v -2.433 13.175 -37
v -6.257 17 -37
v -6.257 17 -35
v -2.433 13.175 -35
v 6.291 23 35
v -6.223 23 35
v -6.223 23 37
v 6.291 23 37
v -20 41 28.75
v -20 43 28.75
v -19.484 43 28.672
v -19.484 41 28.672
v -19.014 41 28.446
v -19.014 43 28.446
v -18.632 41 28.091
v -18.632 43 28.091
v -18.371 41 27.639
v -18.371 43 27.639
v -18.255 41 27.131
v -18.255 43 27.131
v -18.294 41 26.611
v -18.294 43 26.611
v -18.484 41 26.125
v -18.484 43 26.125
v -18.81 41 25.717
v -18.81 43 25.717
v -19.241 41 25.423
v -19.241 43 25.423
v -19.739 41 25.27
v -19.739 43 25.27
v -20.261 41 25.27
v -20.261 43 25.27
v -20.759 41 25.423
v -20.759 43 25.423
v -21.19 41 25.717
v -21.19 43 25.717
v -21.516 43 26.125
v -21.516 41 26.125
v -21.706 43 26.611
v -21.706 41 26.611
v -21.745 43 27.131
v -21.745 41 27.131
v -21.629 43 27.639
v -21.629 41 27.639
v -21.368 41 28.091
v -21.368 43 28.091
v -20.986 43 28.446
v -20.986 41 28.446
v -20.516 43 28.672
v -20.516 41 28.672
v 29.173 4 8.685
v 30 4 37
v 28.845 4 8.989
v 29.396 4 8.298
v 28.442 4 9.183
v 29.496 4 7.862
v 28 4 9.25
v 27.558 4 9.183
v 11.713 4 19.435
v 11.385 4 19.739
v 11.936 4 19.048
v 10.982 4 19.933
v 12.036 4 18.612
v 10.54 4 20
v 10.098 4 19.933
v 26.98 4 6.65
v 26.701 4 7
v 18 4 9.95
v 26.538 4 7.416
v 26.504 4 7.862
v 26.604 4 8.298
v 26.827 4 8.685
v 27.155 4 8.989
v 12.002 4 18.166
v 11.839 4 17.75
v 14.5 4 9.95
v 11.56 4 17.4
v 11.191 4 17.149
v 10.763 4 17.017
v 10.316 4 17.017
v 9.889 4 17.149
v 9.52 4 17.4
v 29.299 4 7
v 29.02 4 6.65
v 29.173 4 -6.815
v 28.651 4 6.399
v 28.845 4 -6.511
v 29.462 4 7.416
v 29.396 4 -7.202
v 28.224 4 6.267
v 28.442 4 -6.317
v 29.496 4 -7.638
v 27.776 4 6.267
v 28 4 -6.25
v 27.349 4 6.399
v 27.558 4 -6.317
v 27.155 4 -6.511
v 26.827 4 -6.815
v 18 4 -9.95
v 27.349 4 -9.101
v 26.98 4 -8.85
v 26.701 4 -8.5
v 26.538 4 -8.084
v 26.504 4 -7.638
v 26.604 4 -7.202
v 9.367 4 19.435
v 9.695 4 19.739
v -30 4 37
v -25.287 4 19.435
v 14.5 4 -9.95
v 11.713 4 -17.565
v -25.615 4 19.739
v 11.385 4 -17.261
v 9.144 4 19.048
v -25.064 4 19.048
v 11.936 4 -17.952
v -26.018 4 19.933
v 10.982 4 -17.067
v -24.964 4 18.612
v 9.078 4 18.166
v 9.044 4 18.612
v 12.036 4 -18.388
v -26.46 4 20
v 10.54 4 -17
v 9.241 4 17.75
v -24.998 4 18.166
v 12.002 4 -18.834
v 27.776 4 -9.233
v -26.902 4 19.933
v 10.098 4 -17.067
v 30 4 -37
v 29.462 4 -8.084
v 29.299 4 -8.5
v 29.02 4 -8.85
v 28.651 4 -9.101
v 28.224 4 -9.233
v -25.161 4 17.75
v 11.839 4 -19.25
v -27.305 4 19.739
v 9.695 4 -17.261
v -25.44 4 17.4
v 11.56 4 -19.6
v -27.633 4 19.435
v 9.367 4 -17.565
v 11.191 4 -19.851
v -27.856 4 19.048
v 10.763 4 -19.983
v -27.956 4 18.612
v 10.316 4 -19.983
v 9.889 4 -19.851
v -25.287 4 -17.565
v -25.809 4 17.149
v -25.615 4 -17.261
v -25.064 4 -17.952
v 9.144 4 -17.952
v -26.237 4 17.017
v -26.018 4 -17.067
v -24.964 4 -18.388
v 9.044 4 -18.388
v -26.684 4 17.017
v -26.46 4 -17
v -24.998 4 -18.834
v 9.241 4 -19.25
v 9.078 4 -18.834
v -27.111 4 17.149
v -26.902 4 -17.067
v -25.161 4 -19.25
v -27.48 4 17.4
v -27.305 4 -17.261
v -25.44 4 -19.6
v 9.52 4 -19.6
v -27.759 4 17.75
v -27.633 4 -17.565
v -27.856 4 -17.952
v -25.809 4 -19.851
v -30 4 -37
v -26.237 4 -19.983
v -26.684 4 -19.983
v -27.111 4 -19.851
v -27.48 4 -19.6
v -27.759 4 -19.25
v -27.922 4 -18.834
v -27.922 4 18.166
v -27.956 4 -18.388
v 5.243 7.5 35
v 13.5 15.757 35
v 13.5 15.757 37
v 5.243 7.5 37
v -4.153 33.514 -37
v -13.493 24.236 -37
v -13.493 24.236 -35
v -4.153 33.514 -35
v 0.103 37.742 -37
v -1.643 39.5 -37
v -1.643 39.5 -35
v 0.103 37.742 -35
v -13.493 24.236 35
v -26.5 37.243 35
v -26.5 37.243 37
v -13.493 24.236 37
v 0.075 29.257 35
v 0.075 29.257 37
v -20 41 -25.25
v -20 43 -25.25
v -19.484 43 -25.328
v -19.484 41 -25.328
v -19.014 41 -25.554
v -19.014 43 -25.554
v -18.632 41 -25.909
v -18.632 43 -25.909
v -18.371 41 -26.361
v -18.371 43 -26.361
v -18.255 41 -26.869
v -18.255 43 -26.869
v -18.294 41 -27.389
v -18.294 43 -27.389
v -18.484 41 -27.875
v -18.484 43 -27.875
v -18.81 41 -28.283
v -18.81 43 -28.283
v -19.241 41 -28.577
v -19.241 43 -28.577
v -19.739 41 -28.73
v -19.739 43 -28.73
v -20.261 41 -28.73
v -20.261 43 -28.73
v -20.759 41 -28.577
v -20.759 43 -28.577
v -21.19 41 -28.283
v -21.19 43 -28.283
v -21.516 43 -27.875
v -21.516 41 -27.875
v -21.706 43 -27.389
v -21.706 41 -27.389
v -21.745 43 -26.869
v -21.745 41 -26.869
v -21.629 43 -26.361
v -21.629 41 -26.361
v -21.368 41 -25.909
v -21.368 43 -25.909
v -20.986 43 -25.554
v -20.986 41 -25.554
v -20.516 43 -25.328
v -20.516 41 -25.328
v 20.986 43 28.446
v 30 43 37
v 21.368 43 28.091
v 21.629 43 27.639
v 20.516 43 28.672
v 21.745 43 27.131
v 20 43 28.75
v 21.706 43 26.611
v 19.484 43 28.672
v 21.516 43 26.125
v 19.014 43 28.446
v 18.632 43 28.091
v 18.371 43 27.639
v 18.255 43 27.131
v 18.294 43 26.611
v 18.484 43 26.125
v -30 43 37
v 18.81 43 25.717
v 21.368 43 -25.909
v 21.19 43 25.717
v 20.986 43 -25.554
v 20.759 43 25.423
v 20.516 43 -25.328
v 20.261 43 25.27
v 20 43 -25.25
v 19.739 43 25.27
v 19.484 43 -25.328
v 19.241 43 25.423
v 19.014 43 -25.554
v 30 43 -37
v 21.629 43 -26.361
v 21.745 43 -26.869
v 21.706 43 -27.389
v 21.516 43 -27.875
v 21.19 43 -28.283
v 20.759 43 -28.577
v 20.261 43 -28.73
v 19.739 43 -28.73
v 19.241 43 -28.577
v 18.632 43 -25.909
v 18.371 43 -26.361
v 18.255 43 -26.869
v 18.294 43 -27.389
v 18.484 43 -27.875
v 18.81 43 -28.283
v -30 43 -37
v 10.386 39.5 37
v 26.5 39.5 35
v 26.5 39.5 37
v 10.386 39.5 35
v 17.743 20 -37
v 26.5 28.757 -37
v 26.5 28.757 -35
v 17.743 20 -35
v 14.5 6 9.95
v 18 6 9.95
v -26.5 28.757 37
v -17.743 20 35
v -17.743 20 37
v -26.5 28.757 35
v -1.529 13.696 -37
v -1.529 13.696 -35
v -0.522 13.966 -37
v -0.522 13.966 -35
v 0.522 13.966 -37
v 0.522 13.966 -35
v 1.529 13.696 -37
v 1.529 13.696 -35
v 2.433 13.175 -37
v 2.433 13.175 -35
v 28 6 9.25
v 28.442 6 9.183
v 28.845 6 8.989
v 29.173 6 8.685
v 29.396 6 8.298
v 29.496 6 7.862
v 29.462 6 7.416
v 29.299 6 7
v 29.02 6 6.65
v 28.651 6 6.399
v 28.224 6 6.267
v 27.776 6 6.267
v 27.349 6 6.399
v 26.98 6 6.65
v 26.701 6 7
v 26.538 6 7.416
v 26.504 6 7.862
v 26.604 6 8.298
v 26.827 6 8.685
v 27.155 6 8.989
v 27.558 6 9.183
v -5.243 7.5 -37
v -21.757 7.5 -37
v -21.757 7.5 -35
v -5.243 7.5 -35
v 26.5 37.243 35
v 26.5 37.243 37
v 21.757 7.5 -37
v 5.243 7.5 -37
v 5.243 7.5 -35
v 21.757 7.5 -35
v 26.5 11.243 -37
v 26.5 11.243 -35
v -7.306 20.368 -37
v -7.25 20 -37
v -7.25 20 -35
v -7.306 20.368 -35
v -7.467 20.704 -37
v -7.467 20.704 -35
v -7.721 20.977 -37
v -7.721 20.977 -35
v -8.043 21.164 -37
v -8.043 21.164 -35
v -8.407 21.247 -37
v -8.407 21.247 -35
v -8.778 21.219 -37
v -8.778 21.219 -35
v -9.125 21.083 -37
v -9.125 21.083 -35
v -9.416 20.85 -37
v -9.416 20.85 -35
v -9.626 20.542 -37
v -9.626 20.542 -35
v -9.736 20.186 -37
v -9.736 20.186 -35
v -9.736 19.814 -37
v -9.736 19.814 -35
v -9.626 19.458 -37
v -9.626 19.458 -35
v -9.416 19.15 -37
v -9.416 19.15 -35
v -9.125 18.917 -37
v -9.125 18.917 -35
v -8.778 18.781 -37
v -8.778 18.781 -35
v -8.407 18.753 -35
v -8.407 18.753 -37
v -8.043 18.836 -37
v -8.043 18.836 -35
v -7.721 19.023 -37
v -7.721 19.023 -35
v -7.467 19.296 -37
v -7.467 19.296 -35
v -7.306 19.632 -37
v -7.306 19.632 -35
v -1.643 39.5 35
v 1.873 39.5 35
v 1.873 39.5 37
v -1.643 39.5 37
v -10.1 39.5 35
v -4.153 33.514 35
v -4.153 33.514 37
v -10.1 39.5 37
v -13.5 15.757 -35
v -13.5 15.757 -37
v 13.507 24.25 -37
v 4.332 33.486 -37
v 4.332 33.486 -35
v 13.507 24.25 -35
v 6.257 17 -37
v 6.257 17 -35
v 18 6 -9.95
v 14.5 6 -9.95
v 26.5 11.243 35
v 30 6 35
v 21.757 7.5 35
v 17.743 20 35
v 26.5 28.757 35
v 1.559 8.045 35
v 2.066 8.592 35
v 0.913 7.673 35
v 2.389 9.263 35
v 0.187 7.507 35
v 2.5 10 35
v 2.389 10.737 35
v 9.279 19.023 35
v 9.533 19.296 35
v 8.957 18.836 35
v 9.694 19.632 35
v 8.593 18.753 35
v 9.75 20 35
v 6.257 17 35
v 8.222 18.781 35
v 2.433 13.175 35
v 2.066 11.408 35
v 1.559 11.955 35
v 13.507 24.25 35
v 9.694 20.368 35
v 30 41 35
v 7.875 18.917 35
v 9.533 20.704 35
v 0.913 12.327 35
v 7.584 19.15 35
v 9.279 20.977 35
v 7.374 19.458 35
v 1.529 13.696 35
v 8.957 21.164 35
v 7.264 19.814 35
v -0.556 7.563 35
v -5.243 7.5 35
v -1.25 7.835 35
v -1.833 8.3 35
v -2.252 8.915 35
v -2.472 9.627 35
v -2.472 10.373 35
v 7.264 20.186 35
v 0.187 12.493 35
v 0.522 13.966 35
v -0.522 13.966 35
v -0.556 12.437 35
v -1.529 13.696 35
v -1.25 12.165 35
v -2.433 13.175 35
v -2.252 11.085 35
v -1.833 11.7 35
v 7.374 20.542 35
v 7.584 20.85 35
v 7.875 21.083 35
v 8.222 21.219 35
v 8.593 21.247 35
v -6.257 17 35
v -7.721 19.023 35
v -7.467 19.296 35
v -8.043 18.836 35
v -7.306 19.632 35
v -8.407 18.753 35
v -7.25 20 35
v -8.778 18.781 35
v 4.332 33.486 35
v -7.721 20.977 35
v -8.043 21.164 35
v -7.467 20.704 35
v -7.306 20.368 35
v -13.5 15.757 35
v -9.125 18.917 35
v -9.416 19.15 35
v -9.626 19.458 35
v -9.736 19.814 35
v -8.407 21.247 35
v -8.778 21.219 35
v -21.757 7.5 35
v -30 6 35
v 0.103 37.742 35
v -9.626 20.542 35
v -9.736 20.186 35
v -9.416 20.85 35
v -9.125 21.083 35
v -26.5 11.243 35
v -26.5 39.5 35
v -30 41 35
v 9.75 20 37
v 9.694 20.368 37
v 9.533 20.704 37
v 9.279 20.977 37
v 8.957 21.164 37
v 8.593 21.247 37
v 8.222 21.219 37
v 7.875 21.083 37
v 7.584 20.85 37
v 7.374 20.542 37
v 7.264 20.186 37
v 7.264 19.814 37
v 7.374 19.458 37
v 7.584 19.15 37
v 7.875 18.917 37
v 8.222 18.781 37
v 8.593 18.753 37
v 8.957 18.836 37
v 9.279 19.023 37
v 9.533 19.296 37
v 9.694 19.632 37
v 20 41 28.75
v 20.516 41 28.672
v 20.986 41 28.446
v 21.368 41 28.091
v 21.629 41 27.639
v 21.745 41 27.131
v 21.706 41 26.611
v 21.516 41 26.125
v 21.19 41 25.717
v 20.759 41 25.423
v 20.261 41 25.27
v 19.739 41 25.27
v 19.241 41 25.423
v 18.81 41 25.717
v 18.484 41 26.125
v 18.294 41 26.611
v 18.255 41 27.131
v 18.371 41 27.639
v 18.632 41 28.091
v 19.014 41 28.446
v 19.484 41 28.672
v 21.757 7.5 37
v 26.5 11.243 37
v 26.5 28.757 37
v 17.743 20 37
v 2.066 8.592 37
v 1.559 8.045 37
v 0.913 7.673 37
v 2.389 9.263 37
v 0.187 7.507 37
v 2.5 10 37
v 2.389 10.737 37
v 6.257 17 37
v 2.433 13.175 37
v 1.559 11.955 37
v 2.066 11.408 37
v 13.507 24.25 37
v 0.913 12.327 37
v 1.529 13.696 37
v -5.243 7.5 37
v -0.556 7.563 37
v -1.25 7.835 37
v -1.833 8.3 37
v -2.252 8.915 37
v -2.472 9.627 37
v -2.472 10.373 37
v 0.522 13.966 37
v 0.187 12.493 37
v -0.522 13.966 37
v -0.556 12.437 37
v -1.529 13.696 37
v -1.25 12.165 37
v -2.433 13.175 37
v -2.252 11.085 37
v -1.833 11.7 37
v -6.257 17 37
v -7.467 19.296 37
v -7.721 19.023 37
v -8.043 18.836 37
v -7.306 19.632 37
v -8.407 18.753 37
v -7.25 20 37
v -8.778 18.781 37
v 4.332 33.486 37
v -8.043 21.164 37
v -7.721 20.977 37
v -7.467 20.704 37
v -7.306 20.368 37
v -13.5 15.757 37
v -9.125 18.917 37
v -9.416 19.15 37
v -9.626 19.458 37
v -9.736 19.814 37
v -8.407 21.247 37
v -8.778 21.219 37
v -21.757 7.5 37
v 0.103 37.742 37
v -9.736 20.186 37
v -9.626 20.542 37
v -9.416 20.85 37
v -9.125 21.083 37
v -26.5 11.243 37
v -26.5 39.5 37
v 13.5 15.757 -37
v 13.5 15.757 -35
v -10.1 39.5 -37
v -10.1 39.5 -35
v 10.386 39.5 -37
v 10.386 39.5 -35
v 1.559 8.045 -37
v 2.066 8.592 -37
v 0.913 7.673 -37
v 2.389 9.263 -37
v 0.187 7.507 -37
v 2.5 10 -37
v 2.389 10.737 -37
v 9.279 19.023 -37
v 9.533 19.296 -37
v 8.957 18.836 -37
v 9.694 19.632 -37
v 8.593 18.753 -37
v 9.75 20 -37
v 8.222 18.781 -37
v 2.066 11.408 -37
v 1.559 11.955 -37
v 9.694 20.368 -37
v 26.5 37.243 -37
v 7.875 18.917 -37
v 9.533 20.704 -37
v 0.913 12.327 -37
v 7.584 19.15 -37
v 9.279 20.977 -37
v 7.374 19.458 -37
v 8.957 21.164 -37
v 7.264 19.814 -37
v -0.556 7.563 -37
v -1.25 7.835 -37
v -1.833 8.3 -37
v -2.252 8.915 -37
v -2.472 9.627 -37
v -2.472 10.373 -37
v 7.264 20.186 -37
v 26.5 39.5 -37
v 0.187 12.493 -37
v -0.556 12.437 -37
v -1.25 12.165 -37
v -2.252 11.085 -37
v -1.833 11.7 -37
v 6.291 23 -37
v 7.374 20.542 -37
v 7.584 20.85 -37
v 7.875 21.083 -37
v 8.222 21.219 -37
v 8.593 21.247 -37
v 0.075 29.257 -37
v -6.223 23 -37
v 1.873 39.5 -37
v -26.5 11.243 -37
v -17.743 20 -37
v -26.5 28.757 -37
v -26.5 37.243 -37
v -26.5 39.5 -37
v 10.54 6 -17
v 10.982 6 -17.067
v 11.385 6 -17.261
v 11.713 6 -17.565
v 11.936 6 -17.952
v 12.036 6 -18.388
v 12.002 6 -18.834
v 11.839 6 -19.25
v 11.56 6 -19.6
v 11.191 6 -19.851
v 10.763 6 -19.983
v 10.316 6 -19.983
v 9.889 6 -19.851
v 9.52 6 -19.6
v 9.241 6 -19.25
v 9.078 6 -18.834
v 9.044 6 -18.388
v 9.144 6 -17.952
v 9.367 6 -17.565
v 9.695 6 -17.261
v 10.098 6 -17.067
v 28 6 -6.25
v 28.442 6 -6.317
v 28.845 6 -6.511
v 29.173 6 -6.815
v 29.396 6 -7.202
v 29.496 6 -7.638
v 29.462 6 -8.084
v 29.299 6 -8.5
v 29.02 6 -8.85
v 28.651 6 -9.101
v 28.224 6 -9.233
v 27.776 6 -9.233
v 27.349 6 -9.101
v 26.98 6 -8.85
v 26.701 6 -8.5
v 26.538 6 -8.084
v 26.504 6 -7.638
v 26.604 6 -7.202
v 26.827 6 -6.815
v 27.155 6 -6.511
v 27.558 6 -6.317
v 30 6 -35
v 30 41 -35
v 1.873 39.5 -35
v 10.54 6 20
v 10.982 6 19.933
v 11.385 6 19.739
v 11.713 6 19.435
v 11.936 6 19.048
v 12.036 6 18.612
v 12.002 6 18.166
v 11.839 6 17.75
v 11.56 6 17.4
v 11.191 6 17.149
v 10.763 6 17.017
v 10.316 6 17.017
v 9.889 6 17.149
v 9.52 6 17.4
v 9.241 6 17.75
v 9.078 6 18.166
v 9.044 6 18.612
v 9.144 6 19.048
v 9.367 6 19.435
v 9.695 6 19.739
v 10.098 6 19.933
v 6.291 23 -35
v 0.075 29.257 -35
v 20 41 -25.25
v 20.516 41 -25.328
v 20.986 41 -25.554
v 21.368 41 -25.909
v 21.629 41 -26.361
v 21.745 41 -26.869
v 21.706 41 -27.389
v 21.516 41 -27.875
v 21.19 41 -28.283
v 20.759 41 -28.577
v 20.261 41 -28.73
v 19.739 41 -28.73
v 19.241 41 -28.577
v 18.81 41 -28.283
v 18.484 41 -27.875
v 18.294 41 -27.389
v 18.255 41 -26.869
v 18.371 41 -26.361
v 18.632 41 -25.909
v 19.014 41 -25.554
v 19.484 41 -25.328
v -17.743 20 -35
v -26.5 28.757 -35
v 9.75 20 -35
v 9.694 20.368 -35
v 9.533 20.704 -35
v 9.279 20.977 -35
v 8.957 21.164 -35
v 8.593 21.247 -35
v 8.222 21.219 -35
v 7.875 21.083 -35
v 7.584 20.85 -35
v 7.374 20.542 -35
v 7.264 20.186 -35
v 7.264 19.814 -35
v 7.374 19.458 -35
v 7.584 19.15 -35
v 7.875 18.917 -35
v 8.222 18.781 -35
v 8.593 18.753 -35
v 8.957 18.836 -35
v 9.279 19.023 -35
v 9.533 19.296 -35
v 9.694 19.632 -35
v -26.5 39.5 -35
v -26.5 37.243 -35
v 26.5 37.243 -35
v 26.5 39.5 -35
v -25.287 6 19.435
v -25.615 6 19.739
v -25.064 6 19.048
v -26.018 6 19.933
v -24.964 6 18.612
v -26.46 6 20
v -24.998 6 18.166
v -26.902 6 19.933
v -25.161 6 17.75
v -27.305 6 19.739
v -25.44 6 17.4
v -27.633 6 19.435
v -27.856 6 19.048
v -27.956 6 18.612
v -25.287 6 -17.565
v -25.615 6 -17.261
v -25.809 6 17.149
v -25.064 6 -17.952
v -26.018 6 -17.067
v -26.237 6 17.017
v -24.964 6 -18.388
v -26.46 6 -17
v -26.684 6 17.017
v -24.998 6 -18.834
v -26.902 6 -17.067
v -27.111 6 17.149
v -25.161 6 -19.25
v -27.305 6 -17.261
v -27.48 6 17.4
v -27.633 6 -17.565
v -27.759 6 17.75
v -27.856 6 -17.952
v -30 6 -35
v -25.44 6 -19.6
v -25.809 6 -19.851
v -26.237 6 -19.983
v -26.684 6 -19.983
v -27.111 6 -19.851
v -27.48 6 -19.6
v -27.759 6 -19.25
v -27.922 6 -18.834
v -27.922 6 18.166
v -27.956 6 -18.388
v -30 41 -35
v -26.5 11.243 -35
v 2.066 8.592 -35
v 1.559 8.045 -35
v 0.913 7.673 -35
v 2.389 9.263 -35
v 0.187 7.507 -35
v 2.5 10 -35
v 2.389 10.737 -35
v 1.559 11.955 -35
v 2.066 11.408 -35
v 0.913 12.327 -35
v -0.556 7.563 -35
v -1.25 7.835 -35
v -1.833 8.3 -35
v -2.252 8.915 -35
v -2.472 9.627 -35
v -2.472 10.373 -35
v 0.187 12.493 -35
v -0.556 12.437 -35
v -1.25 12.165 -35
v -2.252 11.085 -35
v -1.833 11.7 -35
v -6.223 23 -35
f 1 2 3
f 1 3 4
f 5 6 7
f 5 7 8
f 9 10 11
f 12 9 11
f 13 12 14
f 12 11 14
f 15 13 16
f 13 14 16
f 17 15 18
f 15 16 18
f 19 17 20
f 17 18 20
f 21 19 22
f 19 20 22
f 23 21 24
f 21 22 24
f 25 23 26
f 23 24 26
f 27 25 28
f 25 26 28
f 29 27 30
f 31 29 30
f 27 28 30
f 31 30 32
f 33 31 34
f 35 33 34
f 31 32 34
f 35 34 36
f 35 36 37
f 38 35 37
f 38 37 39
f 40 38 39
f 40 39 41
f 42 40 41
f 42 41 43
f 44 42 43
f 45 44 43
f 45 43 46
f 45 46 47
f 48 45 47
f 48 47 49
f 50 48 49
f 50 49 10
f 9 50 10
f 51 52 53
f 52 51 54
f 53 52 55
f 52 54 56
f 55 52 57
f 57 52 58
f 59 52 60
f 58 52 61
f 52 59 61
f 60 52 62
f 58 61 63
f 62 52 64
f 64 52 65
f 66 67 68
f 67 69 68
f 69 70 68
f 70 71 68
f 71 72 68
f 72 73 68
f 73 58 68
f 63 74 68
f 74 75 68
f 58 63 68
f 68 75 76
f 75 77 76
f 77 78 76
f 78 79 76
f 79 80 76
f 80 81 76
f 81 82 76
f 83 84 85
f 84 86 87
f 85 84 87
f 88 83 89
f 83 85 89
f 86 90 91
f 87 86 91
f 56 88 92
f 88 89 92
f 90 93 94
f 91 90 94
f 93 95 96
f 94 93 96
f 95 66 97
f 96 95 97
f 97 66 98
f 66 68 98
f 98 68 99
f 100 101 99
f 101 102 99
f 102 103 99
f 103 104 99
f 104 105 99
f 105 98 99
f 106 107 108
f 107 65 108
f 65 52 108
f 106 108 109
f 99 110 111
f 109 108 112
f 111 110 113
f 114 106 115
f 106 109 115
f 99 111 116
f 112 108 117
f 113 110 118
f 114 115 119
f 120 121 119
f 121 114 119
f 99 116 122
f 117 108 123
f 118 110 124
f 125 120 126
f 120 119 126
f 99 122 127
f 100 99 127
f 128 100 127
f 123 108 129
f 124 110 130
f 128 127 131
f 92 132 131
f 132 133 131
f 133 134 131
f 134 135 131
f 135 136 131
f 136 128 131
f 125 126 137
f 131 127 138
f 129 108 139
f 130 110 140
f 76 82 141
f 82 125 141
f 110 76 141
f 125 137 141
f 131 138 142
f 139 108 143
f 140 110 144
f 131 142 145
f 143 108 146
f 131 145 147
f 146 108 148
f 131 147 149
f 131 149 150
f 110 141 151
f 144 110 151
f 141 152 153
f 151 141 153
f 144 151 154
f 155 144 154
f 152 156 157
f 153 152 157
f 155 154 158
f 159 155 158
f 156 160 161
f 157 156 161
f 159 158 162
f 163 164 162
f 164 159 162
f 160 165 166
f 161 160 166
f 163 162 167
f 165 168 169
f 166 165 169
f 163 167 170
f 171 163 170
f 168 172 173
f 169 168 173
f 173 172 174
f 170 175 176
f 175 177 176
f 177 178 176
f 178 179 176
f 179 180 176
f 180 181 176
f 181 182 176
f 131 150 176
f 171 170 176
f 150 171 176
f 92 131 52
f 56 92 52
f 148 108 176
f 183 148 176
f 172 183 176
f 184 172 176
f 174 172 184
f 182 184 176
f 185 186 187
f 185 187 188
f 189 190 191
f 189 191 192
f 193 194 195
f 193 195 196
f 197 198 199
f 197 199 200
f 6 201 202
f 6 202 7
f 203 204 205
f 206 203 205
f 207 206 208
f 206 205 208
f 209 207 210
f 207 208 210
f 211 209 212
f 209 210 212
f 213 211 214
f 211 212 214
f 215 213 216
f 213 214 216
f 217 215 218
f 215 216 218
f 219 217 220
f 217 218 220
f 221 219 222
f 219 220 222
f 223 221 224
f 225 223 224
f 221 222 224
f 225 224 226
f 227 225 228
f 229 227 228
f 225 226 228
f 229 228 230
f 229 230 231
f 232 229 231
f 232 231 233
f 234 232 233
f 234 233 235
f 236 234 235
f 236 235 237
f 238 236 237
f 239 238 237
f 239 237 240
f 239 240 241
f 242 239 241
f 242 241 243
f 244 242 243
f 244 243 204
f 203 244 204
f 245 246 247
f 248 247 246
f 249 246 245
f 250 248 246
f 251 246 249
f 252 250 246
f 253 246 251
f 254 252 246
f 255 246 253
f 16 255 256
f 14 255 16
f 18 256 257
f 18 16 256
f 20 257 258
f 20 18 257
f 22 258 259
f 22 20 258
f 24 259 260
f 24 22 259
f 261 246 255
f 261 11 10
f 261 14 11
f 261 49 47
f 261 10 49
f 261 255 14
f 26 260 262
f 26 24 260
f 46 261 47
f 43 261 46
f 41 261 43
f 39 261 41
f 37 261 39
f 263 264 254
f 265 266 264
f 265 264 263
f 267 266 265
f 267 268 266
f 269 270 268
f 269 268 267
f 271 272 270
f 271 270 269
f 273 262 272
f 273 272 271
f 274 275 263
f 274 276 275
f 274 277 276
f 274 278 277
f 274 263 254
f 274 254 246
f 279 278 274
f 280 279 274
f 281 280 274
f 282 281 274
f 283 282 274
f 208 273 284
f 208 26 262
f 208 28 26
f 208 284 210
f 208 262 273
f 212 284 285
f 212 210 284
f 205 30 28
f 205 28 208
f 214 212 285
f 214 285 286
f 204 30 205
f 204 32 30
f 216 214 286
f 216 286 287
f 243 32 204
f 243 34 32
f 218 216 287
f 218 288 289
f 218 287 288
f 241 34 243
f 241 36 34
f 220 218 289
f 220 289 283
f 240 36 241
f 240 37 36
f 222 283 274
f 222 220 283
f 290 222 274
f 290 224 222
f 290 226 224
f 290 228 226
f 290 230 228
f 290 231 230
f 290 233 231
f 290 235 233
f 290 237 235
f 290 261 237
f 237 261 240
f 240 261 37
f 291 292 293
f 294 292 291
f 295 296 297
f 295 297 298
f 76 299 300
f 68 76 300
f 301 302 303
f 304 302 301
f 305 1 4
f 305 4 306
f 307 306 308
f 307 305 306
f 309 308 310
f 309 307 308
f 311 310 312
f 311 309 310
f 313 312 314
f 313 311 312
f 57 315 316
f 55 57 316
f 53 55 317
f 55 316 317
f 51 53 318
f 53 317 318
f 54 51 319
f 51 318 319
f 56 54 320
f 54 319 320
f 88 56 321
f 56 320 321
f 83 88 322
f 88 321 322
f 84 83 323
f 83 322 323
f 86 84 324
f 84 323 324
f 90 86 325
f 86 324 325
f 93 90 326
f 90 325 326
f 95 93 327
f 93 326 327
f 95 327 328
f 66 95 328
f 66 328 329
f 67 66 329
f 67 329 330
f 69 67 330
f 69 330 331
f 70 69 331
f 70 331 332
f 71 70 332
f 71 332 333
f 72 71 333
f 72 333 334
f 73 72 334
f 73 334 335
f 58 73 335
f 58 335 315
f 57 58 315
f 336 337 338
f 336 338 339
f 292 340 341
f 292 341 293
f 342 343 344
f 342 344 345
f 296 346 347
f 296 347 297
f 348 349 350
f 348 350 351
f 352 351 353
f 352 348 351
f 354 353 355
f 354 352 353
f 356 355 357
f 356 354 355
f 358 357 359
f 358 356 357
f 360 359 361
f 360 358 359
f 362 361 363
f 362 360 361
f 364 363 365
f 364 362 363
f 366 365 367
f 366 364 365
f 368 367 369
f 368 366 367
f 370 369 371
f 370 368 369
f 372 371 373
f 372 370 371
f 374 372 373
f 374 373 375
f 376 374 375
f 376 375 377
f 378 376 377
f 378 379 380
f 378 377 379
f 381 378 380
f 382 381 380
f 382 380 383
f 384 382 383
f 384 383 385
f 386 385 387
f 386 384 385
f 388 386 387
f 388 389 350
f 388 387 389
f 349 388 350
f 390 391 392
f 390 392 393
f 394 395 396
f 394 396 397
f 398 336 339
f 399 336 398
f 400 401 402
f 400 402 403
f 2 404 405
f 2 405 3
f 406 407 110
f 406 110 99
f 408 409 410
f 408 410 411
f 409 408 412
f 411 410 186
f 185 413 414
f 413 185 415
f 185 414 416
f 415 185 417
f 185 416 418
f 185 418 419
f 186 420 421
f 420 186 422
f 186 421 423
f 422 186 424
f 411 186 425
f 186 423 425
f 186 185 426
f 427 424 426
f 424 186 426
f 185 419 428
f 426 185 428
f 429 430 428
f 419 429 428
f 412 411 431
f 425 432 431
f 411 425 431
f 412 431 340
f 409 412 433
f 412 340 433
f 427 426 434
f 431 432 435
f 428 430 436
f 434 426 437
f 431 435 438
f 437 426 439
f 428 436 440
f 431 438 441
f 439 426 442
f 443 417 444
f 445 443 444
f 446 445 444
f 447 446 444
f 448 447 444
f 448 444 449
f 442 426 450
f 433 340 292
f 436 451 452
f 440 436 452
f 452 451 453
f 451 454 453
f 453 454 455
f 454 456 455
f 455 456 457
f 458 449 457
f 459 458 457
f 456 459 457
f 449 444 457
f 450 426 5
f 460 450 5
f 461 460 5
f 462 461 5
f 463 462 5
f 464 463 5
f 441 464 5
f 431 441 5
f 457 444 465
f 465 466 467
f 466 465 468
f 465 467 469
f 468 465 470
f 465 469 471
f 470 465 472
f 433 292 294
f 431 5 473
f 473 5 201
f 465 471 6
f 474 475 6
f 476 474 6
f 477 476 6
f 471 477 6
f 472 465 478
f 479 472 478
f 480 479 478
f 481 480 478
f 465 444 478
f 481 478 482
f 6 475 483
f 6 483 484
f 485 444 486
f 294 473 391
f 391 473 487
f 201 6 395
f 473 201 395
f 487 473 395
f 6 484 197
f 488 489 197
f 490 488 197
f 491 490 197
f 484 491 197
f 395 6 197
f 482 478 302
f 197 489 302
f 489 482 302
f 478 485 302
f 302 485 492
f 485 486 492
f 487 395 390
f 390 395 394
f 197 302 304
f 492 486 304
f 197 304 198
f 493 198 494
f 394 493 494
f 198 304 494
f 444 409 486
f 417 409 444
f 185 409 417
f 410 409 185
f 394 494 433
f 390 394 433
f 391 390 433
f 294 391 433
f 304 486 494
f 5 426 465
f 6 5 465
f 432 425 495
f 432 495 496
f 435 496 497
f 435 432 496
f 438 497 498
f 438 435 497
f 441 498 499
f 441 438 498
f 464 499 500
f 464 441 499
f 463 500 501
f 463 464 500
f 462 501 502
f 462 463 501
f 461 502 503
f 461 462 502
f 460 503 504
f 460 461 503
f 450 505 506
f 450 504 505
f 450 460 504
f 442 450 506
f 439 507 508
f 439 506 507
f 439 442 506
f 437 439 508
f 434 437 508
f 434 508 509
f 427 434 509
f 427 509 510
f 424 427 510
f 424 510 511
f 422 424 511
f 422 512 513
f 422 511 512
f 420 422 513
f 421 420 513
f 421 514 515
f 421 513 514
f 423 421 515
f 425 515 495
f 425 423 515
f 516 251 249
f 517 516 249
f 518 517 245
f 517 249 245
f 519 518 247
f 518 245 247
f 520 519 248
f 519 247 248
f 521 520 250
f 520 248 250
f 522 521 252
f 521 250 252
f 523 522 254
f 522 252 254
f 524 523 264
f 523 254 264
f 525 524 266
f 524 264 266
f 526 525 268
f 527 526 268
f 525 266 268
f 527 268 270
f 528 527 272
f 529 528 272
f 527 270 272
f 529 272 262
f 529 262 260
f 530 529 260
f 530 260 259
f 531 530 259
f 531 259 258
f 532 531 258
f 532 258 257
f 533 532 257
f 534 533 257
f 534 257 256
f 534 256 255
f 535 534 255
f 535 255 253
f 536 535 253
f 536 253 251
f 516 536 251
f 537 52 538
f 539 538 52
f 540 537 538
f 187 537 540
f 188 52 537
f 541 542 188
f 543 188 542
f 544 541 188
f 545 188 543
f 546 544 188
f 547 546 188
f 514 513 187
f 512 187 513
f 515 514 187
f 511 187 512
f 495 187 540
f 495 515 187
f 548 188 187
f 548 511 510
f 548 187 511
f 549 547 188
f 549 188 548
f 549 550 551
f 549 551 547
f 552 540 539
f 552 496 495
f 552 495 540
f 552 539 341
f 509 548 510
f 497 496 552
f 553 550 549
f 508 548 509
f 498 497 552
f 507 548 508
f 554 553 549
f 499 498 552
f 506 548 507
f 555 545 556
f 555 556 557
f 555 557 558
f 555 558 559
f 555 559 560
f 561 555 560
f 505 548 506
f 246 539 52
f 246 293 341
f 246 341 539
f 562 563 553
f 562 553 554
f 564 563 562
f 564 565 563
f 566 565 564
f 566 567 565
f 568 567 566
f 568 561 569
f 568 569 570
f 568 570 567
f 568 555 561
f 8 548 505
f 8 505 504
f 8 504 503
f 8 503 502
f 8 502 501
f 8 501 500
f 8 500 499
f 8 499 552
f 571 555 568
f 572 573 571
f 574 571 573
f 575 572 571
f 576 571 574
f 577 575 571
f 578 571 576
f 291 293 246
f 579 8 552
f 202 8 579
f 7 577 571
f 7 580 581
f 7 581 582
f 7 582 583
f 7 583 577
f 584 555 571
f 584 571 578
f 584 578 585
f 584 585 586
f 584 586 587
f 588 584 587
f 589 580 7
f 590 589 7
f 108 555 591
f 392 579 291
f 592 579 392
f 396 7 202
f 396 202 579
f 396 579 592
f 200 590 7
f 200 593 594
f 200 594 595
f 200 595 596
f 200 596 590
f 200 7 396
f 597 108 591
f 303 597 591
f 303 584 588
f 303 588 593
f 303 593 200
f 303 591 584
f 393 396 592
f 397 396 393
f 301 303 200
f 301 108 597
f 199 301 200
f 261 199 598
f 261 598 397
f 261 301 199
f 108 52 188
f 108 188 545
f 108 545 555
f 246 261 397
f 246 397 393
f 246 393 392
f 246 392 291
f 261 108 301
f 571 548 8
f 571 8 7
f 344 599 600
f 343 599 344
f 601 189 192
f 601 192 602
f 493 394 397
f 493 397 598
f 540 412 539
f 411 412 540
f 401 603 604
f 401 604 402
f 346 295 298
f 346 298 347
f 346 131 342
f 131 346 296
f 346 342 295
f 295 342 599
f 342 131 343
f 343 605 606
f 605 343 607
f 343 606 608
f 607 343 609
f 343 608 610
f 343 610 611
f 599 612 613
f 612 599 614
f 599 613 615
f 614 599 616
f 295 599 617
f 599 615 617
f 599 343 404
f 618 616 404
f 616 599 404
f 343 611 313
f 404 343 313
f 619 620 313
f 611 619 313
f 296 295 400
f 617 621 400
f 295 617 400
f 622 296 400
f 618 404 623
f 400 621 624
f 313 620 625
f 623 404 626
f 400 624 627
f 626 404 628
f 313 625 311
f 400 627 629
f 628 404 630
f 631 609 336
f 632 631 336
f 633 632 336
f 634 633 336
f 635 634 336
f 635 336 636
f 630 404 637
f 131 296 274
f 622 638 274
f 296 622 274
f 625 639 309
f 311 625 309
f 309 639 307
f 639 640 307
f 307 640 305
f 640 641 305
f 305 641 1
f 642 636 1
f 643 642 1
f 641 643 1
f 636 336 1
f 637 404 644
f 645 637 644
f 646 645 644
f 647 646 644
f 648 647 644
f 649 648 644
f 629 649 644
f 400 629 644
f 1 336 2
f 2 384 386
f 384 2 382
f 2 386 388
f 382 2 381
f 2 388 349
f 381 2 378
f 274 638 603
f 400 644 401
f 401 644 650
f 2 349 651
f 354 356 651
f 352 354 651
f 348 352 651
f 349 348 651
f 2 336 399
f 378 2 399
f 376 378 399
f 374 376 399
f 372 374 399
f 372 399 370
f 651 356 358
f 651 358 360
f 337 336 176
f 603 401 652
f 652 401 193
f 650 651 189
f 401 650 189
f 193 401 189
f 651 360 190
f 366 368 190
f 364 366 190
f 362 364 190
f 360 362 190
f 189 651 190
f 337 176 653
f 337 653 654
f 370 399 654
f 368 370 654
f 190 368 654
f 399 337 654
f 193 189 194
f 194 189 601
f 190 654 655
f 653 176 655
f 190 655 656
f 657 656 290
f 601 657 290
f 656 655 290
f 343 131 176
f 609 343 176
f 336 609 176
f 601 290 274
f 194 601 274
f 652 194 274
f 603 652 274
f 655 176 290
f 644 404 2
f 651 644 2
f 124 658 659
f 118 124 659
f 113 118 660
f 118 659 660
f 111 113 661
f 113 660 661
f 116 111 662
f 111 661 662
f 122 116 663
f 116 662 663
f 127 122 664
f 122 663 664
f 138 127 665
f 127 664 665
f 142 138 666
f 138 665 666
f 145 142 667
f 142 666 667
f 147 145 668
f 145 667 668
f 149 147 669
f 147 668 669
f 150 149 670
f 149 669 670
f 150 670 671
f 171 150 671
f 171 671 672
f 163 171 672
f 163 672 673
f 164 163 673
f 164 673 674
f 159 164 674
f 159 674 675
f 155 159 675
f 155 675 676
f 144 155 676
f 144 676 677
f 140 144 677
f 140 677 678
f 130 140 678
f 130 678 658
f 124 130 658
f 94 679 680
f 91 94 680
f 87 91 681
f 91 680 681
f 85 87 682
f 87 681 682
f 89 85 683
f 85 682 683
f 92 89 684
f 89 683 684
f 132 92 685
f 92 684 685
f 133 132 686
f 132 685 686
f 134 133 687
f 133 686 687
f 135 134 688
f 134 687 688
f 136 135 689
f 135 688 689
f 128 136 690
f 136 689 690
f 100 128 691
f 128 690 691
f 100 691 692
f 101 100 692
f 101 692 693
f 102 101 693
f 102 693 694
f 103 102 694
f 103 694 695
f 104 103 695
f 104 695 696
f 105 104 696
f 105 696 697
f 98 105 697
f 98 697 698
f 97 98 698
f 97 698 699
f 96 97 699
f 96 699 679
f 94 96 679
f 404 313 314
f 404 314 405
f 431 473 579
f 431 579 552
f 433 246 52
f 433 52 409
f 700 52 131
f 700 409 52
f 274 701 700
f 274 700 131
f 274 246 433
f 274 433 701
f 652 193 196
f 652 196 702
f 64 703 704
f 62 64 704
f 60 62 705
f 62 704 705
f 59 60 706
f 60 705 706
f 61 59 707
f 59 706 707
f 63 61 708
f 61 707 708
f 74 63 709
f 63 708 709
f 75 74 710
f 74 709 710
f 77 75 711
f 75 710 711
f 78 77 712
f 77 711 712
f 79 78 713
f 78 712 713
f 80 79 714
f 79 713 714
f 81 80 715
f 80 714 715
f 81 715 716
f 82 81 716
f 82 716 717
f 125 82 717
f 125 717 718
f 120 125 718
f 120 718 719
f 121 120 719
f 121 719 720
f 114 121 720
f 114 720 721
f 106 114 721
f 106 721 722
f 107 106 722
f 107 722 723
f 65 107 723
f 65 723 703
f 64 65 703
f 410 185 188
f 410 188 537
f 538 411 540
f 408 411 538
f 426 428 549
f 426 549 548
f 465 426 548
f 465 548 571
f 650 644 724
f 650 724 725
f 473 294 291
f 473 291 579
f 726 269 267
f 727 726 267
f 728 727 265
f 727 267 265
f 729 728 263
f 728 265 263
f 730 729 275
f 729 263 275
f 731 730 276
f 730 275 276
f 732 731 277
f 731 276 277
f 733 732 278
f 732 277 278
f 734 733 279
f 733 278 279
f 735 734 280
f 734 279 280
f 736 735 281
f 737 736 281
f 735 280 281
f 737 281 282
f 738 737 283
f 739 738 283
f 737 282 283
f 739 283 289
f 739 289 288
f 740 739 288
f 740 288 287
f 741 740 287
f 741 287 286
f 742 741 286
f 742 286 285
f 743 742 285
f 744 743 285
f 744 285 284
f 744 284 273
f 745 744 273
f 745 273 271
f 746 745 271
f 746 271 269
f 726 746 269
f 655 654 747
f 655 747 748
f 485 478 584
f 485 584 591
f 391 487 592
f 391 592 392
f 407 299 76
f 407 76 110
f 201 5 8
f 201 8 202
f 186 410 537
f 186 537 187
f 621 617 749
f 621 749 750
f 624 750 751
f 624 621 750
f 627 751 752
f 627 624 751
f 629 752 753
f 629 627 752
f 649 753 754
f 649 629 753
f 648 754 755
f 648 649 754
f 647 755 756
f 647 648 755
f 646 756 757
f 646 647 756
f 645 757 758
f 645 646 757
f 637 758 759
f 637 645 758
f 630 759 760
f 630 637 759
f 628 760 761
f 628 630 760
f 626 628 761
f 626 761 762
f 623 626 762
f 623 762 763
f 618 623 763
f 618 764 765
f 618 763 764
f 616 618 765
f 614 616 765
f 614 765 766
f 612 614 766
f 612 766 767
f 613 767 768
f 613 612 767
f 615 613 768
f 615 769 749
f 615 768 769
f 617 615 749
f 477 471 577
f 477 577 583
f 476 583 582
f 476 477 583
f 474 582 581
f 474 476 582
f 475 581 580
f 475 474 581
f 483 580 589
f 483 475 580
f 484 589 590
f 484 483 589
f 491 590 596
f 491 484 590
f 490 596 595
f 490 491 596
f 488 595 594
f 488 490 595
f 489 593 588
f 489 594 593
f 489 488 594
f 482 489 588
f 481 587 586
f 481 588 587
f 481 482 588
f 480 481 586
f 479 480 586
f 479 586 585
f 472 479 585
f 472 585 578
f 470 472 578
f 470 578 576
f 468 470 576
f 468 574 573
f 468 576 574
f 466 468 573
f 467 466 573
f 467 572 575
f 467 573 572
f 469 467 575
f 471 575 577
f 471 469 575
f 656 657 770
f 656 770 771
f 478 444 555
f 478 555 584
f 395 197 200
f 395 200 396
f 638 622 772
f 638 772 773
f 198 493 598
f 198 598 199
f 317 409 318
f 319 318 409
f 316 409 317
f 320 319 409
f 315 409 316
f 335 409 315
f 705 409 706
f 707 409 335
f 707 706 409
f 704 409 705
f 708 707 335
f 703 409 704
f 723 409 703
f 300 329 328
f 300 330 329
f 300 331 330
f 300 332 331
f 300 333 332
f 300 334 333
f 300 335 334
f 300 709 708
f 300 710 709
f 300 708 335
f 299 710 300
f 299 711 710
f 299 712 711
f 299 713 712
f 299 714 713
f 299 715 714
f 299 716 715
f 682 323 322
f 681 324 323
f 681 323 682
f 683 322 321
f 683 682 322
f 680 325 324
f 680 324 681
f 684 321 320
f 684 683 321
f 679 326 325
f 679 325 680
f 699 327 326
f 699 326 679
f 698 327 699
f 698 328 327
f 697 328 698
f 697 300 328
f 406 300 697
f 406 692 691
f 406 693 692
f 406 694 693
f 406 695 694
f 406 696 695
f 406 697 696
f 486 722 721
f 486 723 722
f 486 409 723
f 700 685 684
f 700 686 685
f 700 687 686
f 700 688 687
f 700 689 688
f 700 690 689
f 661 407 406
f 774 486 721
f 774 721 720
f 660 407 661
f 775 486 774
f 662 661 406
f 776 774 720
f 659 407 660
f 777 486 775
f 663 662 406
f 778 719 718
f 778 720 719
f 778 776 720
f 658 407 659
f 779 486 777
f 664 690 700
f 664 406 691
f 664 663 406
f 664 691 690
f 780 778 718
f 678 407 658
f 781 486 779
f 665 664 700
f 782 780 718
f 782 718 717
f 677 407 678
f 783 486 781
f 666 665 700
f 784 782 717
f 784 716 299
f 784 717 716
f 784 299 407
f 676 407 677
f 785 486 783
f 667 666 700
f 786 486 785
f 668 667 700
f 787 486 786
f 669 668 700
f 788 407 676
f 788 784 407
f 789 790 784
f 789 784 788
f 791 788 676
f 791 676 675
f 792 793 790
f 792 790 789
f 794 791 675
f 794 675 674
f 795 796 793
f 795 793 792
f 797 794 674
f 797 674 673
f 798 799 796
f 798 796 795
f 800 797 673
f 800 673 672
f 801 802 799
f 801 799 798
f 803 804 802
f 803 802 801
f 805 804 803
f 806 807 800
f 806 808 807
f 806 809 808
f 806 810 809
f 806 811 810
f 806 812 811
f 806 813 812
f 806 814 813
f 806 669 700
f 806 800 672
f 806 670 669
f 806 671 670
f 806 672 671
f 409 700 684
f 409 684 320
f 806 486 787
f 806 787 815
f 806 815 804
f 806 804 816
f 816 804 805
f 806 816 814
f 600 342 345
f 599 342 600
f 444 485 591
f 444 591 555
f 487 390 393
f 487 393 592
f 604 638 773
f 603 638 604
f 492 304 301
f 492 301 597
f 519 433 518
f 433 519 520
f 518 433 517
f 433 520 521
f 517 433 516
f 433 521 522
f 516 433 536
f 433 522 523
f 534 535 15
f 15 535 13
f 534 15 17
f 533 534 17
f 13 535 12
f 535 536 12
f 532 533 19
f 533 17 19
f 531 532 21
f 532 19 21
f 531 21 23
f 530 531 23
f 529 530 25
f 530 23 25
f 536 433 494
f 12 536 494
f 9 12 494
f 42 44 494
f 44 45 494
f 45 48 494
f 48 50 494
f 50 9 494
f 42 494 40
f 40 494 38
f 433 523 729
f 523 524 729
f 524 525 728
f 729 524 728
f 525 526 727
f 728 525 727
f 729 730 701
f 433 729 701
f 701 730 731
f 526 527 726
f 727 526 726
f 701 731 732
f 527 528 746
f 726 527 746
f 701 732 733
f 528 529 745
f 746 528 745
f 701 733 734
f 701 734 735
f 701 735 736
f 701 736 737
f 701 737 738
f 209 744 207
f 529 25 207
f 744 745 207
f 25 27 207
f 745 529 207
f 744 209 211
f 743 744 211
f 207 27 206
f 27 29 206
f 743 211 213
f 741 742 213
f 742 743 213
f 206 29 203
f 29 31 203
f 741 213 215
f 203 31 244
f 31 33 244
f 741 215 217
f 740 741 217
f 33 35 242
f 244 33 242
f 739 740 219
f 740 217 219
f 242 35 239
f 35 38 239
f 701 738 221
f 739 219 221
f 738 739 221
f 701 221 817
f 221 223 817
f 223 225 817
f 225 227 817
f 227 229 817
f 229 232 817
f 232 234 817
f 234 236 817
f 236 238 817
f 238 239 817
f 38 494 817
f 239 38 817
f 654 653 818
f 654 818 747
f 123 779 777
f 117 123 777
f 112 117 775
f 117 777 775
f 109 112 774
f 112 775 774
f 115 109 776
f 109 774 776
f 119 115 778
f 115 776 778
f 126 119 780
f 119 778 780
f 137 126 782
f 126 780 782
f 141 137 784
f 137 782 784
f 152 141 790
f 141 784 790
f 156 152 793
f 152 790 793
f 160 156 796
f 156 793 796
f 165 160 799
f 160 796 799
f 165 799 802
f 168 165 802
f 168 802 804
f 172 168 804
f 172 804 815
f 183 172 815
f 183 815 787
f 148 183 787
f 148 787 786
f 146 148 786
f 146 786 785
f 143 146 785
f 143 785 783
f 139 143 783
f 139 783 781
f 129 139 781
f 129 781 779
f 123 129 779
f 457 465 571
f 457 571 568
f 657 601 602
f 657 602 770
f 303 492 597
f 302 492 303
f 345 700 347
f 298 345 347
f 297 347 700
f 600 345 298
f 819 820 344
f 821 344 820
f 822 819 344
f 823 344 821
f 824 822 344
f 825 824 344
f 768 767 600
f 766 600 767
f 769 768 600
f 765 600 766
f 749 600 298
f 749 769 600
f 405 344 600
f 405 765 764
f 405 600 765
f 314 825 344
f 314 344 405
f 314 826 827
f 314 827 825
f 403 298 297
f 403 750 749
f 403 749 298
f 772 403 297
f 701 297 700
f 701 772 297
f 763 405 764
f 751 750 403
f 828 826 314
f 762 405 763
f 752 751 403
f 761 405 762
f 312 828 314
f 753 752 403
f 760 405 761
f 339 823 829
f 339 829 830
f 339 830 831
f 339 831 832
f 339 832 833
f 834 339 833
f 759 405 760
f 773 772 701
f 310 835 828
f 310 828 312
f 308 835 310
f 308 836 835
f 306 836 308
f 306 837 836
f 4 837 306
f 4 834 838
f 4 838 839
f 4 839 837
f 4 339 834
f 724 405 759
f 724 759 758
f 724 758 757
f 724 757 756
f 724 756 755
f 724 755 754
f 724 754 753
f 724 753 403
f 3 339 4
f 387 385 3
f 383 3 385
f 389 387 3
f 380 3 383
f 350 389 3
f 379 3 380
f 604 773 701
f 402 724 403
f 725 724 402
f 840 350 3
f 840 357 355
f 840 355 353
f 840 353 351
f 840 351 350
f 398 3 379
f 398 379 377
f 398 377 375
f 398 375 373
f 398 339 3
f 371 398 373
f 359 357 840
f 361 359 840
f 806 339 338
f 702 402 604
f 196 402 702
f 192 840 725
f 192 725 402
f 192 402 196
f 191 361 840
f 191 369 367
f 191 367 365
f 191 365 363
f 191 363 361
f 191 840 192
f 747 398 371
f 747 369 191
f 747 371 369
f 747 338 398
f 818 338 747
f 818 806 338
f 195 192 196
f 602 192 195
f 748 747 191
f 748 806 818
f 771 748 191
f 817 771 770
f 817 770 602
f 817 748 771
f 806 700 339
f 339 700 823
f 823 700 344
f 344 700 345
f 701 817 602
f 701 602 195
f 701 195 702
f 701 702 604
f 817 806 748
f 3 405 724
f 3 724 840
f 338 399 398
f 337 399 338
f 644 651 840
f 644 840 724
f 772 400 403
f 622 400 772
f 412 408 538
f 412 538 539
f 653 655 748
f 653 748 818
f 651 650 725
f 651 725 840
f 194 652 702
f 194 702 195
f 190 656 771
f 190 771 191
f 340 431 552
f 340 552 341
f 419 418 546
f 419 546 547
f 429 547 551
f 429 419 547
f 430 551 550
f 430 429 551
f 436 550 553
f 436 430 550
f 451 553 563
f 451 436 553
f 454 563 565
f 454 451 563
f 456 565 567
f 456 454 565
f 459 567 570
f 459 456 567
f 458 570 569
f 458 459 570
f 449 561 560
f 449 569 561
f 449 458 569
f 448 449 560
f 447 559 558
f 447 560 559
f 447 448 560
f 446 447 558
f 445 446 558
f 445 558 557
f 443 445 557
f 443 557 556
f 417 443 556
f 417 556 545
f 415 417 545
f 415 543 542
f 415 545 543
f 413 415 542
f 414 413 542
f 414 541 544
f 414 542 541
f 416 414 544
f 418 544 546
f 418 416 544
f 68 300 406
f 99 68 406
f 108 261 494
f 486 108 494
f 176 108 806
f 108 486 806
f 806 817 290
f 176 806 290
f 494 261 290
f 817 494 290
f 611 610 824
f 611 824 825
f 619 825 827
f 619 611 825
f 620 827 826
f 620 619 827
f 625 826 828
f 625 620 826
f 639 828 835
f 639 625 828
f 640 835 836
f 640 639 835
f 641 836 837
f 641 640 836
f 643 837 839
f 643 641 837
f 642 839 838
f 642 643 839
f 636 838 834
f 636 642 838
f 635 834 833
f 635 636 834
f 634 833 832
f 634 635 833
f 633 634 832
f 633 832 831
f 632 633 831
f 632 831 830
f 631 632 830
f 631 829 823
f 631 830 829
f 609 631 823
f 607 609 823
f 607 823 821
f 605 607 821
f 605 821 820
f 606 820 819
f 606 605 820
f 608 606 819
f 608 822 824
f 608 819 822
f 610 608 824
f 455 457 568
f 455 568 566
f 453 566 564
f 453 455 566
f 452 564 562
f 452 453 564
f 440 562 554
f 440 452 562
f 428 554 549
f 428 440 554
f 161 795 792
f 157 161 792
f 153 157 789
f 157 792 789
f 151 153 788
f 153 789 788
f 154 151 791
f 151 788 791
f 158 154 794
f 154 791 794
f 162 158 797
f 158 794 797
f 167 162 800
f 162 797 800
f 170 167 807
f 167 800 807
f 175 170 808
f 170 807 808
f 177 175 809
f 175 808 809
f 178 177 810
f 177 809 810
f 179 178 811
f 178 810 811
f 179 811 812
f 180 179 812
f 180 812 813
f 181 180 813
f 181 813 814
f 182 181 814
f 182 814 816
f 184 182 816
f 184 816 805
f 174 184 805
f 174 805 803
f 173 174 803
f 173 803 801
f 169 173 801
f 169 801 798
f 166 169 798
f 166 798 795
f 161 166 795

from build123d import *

# Parameters (mm, degrees)
BOSS_EXTRUDE1_DEPTH      = 30
BOSS_EXTRUDE1_DEPTH_BACK = 30
SKETCH2_W                = 74
SKETCH2_H                = 39
SKETCH2_W_2              = 70
SKETCH2_H_2              = 35
CUT_EXTRUDE1_DEPTH       = 65.171644829
CUT_EXTRUDE1_DEPTH_BACK  = 65.171644829
SKETCH1_R                = 1.25
SKETCH1_R_2              = 2.5
CUT_EXTRUDE2_START       = -37
CUT_EXTRUDE2_DEPTH       = 74
SKETCH4_R                = 1.75
CUT_EXTRUDE3_DEPTH       = 3
SKETCH5_R                = 1.5
SKETCH5_W                = 3.5
SKETCH5_H                = 19.9
CUT_EXTRUDE4_DEPTH       = 61.3158354


# Read off the part's stored shape, not the designer's step: Cut-Extrude2
with BuildPart() as part:
    # Sketch2 → Boss-Extrude1 (new, two sides: drawn at the far end of the back side and taken through both)
    with BuildSketch(Plane(origin=(0, 0, 0), x_dir=(0, 0, -1), z_dir=(1, 0, 0)).offset(-BOSS_EXTRUDE1_DEPTH_BACK)):
        with Locations((0, 23.5)):
            Rectangle(SKETCH2_W, SKETCH2_H)
        with Locations((0, 23.5)):
            Rectangle(SKETCH2_W_2, SKETCH2_H_2, mode=Mode.SUBTRACT)
    extrude(amount=BOSS_EXTRUDE1_DEPTH + BOSS_EXTRUDE1_DEPTH_BACK)

    # Sketch1 → Cut-Extrude1 (cut, two sides: drawn at the far end of the back side and taken through both)
    with BuildSketch(Plane.XY.offset(-CUT_EXTRUDE1_DEPTH_BACK)):
        with Locations((8.5, 20)):
            Circle(SKETCH1_R)
        with Locations((-8.5, 20)):
            Circle(SKETCH1_R)
        with Locations((0, 10)):
            Circle(SKETCH1_R_2)
    extrude(amount=CUT_EXTRUDE1_DEPTH + CUT_EXTRUDE1_DEPTH_BACK, mode=Mode.SUBTRACT)

    # Cut-Extrude2 outline → Cut-Extrude2 (cut)
    with BuildSketch(Plane.XY.offset(CUT_EXTRUDE2_START)):
        Polygon((-6.223385238, 23), (6.291063493, 23), (0.075182746, 29.257087778), align=None)
        Polygon((-13.493003356, 24.235644043), (-4.153418424, 33.513721677), (-10.100273174, 39.5), (-26.5, 39.5), (-26.5, 37.242640687), align=None)
        Polygon((10.385998459, 39.5), (4.331816644, 33.485688948), (13.507019797, 24.249660484), (26.5, 37.242640687), (26.5, 39.5), align=None)
        Polygon((21.757359313, 7.5), (13.5, 15.757359313), (5.242640687, 7.5), align=None)
        Polygon((26.5, 28.757359313), (17.742640687, 20), (26.5, 11.242640687), align=None)
        Polygon((-13.5, 15.757359313), (-21.757359313, 7.5), (-5.242640687, 7.5), align=None)
        with BuildLine():
            Line((2.432627089, 13.175267776), (6.257359313, 17))
            Line((6.257359313, 17), (-6.257359313, 17))
            Line((-6.257359313, 17), (-2.432627089, 13.175267776))
            ThreePointArc((-2.432627089, 13.175267776), (0, 14), (2.432627089, 13.175267776))
        make_face()
        Polygon((-26.5, 11.242640687), (-17.742640687, 20), (-26.5, 28.757359313), align=None)
        Polygon((1.872544824, 39.5), (-1.642886221, 39.5), (0.103215475, 37.742322846), align=None)
    extrude(amount=CUT_EXTRUDE2_DEPTH, mode=Mode.SUBTRACT)

    # Sketch4 → Cut-Extrude3 (cut)
    with BuildSketch(Plane(origin=(0, 43, 0), x_dir=(1, 0, 0), z_dir=(0, 1, 0))):
        with Locations(Location((-20, 27, 0), (0, 0, 270))):
            Circle(SKETCH4_R)
        with Locations(Location((20, 27, 0), (0, 0, 270))):
            Circle(SKETCH4_R)
        with Locations(Location((20, -27, 0), (0, 0, 270))):
            Circle(SKETCH4_R)
        with Locations(Location((-20, -27, 0), (0, 0, 270))):
            Circle(SKETCH4_R)
    extrude(amount=-CUT_EXTRUDE3_DEPTH, mode=Mode.SUBTRACT)

    # Sketch5 → Cut-Extrude4 (cut, through all)
    with BuildSketch(Plane(origin=(0, 6, 0), x_dir=(1, 0, 0), z_dir=(0, 1, 0))):
        with Locations(Location((-26.460092097, -18.5, 0), (0, 0, 270))):
            Circle(SKETCH5_R)
        with Locations(Location((-26.460092097, 18.5, 0), (0, 0, 270))):
            Circle(SKETCH5_R)
        with Locations(Location((10.539907903, 18.5, 0), (0, 0, 270))):
            Circle(SKETCH5_R)
        with Locations(Location((10.539907903, -18.5, 0), (0, 0, 270))):
            Circle(SKETCH5_R)
        with Locations(Location((28, -7.75, 0), (0, 0, 270))):
            Circle(SKETCH5_R)
        with Locations(Location((28, 7.75, 0), (0, 0, 270))):
            Circle(SKETCH5_R)
        with Locations((16.25, 0)):
            Rectangle(SKETCH5_W, SKETCH5_H)
    extrude(amount=-CUT_EXTRUDE4_DEPTH, mode=Mode.SUBTRACT)


solid = part.part
